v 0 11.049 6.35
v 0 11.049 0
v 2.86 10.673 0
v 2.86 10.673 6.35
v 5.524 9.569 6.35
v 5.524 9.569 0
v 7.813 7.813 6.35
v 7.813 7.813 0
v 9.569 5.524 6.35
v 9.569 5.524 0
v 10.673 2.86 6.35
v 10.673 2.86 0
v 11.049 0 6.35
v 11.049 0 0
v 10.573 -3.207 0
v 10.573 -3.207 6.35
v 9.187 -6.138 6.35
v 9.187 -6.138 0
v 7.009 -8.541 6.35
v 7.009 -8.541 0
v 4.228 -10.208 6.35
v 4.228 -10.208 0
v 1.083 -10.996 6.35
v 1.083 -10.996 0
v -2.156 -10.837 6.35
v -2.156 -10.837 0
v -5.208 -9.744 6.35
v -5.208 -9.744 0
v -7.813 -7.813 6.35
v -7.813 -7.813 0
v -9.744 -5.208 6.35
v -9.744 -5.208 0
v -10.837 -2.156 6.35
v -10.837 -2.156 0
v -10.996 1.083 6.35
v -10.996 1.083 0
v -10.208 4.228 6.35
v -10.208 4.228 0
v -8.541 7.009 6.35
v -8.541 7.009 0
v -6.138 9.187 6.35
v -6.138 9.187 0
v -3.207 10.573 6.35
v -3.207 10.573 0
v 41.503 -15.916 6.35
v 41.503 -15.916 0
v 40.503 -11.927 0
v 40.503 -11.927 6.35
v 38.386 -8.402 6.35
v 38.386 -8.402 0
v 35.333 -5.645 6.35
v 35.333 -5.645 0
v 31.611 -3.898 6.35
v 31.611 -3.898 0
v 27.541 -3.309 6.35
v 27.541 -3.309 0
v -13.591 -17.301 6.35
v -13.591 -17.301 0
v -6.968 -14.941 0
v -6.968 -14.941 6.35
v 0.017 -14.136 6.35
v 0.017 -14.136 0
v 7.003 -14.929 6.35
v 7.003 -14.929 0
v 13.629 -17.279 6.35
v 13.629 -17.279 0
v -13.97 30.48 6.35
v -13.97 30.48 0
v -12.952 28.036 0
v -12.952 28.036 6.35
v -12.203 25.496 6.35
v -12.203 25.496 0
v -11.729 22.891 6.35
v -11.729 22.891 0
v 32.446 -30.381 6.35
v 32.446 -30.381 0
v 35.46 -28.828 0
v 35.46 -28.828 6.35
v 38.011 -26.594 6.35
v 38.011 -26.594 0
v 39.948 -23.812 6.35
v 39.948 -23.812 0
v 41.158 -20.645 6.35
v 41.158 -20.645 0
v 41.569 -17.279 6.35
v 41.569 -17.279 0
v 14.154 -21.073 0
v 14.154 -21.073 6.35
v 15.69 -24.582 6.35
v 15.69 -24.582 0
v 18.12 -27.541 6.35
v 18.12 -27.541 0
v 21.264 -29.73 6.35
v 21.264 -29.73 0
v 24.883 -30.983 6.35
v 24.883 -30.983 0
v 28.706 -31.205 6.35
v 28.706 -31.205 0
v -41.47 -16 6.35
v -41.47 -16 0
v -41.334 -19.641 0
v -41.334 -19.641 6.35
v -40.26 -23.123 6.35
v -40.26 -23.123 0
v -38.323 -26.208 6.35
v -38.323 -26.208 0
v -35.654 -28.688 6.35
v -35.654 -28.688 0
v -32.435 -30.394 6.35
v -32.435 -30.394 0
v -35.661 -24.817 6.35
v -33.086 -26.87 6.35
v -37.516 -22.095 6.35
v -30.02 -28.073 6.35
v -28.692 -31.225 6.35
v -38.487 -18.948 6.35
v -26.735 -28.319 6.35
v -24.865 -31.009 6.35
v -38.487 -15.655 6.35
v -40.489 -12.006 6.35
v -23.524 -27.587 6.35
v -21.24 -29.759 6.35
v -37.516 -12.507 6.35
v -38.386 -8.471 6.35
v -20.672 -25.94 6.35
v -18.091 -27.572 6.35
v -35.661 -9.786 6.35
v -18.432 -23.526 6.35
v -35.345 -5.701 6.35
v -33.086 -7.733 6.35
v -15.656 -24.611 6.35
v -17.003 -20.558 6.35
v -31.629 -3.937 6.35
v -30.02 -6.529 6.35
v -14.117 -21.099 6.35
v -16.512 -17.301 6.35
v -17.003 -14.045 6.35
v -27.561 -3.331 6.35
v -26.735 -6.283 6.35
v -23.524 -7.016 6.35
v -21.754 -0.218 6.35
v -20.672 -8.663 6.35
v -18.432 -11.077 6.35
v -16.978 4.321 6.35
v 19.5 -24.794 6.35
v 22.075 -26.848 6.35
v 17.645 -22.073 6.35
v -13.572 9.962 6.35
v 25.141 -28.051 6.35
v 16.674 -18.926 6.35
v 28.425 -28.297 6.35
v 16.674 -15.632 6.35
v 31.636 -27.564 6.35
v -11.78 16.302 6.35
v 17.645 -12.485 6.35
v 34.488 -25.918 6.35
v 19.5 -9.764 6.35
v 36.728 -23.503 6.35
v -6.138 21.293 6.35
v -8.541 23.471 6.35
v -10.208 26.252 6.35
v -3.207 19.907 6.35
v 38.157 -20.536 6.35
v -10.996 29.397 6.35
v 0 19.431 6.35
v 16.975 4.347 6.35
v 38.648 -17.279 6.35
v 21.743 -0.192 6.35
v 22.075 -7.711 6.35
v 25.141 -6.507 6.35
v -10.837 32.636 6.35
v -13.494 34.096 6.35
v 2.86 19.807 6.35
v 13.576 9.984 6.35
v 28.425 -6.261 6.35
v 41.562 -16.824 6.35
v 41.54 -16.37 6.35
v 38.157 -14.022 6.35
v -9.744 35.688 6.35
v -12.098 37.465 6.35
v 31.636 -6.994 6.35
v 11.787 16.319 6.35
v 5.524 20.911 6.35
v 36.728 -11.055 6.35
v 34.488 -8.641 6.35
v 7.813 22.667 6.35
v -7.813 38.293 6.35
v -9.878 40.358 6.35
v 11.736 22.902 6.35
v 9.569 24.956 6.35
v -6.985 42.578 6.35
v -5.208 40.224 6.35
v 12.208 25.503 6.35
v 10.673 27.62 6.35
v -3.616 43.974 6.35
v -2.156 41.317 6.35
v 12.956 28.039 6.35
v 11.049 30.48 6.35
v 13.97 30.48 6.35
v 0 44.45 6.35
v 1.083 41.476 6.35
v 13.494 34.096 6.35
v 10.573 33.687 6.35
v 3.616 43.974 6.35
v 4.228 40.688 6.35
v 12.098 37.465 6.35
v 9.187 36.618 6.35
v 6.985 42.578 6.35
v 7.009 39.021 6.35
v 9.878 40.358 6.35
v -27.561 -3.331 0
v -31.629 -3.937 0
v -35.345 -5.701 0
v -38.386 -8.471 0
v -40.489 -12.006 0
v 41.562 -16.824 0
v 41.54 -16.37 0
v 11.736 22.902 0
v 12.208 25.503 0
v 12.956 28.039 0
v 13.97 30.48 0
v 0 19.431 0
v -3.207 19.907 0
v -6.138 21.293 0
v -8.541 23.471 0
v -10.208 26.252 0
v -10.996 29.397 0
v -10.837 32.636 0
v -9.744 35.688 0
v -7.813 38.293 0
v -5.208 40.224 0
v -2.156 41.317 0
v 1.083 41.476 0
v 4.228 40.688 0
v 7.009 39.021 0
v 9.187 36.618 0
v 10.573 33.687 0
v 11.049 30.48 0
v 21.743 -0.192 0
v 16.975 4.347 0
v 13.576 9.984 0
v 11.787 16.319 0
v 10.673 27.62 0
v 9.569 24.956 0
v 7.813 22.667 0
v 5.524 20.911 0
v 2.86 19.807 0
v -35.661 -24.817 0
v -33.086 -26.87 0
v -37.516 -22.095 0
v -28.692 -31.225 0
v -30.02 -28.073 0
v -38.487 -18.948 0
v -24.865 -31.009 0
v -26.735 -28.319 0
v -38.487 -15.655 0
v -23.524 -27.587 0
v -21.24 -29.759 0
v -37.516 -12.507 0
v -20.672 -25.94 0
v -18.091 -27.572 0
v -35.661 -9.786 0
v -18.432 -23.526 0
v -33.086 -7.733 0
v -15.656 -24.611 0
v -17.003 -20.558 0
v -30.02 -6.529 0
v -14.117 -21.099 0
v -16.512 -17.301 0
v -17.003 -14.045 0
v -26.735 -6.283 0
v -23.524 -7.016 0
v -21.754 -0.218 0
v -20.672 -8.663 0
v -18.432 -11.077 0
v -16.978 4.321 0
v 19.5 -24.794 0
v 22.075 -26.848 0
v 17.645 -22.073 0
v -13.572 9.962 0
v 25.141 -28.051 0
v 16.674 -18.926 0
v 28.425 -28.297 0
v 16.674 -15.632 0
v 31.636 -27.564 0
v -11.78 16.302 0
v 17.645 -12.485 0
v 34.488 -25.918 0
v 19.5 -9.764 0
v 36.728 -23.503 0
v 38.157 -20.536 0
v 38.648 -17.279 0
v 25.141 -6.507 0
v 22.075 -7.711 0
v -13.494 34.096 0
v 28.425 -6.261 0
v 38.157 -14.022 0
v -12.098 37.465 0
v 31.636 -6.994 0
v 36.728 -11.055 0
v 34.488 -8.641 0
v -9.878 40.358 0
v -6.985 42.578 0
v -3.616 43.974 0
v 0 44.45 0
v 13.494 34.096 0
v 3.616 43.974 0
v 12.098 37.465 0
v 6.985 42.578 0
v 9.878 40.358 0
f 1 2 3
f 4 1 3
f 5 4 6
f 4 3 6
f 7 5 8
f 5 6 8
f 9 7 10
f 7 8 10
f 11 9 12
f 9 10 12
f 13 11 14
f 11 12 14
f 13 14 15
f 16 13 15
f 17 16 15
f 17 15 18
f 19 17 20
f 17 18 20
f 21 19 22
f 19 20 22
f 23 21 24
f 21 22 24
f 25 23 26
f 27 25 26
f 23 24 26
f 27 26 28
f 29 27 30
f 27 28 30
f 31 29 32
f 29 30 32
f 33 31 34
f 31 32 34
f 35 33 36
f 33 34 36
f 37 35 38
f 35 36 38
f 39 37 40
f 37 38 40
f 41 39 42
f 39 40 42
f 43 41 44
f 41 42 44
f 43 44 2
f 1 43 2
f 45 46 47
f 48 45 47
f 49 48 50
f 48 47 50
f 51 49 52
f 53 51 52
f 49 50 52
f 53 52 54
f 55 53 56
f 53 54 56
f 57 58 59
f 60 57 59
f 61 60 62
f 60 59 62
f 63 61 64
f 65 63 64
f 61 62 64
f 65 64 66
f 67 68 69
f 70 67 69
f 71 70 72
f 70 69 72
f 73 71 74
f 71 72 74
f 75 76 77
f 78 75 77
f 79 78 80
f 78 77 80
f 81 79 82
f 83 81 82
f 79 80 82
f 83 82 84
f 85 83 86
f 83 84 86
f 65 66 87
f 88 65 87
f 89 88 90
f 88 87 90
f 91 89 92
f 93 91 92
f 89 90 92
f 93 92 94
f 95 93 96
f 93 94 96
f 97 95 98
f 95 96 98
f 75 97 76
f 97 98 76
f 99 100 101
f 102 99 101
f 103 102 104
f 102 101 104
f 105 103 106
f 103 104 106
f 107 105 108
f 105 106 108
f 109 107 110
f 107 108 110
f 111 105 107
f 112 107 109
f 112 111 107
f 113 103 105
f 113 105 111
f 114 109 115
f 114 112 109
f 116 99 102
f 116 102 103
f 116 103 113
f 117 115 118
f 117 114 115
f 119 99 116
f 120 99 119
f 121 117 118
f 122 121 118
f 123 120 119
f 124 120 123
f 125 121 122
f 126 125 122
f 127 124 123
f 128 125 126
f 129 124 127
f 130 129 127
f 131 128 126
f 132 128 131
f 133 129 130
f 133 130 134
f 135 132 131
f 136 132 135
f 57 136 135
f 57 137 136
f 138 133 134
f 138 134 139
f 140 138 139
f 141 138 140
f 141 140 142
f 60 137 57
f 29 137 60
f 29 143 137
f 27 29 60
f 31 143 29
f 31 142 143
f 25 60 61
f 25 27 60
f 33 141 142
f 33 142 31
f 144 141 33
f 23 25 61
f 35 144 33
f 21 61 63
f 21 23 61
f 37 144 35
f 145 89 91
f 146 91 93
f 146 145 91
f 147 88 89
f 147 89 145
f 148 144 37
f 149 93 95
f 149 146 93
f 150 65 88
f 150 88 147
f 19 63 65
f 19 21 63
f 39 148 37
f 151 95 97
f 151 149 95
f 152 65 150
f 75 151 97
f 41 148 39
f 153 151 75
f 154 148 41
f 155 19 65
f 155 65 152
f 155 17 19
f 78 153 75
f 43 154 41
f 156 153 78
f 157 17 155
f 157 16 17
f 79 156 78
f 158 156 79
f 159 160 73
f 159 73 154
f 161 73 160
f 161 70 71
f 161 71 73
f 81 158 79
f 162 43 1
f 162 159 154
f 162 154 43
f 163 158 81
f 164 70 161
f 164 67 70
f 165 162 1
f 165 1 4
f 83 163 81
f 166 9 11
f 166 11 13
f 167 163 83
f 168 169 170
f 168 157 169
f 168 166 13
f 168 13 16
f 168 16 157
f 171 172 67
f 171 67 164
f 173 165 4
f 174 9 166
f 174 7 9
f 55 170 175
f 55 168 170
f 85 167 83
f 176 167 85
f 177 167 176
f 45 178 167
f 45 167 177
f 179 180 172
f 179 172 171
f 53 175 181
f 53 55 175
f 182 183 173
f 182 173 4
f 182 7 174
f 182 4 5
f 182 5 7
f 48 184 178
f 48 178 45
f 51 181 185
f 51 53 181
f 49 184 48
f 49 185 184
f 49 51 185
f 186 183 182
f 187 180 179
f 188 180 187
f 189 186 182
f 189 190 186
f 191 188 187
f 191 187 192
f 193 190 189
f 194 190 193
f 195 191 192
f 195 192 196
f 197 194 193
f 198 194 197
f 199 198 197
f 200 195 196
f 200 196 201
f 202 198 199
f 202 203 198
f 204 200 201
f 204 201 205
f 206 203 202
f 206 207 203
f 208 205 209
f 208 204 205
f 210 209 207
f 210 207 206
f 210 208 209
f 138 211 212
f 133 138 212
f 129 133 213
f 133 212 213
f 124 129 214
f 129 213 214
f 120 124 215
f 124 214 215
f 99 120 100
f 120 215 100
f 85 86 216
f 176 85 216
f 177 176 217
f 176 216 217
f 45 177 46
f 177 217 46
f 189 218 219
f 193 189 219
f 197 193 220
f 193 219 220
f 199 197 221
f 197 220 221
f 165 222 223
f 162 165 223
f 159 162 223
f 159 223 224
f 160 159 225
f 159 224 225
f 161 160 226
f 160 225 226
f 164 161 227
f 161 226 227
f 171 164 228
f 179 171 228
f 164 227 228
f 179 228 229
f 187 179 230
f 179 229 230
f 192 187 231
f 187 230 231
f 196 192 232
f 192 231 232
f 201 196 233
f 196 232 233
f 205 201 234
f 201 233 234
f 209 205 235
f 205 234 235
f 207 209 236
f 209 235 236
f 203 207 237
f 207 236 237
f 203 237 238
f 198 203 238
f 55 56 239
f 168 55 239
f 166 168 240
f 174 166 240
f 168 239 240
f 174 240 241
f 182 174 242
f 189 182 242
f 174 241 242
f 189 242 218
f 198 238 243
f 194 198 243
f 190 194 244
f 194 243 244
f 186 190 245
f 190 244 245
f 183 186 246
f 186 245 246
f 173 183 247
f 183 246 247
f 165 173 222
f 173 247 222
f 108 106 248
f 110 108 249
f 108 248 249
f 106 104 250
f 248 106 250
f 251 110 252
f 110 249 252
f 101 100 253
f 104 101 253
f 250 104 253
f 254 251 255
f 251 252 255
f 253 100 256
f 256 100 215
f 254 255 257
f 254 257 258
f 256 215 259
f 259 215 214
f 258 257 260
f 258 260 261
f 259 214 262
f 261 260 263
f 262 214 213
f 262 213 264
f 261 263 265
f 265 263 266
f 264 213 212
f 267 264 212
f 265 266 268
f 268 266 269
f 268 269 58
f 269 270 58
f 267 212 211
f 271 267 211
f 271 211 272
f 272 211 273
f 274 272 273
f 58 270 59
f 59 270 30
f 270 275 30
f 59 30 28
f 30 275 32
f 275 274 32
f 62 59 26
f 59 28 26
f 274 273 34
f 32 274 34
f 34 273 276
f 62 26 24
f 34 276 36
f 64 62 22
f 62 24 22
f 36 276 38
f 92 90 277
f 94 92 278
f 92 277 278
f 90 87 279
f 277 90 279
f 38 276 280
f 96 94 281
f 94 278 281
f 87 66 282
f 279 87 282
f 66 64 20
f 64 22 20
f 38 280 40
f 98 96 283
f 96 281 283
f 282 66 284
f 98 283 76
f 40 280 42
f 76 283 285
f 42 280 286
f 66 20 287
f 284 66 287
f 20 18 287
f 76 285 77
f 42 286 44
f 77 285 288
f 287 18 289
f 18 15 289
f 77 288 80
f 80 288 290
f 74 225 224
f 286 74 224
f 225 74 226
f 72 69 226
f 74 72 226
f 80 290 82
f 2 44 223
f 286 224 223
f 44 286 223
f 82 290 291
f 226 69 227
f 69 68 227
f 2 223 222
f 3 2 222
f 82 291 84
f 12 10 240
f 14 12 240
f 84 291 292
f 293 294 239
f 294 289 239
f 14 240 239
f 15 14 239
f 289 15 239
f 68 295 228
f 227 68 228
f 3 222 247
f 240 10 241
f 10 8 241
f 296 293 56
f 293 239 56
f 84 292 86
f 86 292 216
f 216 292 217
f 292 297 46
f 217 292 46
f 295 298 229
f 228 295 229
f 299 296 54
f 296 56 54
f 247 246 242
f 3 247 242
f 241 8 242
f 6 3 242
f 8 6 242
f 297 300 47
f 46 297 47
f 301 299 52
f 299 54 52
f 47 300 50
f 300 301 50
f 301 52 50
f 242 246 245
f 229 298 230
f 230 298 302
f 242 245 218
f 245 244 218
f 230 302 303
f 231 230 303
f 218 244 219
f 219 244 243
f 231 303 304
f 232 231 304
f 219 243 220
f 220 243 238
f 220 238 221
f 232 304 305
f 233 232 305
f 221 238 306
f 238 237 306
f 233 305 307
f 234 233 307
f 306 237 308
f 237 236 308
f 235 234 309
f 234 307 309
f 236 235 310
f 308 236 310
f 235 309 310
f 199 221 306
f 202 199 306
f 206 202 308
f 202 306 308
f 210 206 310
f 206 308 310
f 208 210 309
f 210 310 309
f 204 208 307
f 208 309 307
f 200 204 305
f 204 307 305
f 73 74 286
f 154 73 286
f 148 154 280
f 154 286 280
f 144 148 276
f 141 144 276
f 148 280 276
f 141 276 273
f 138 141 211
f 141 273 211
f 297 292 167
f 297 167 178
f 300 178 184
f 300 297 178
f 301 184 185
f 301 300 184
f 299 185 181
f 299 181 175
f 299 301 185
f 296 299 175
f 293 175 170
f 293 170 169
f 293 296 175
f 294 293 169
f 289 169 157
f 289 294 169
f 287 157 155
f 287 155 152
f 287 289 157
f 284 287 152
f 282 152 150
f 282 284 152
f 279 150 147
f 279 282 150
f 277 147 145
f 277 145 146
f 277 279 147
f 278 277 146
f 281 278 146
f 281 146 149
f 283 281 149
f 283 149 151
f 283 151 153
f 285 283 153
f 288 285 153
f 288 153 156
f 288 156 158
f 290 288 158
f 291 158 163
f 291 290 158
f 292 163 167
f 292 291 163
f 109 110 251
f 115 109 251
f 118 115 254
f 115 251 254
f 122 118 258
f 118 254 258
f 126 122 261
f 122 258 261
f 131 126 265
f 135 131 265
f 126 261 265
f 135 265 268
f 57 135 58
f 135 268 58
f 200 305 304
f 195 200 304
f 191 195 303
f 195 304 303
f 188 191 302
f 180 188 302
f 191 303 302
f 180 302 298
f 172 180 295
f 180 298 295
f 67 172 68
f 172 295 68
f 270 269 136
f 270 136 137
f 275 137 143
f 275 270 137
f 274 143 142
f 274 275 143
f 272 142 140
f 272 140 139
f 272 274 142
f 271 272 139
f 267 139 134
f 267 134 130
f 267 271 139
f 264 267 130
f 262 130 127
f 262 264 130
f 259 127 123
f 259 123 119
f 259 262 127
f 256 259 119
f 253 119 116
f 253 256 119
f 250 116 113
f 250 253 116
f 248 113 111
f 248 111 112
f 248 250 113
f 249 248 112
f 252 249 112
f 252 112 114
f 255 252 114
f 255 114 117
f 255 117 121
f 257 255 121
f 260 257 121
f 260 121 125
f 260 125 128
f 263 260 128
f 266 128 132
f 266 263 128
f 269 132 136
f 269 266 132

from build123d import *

# Parameters (mm, degrees)
F0_R     = 11.049
F1_DEPTH = 6.35


with BuildPart() as f1:
    # F0 (on Top) → F1 (new body)
    with BuildSketch(Plane.XY):
        with BuildLine():
            ThreePointArc((13.629375726, -17.2792417221), (17.7003329036, -7.4217648034), (27.5405927913, -3.309365396))
            ThreePointArc((27.5405927913, -3.309365396), (15.086449318, 7.051761798), (11.7361280198, 22.9021243674))
            ThreePointArc((11.7361280198, 22.9021243674), (6.6819898762, 18.2116703951), (0, 16.51))
            ThreePointArc((0, 16.51), (-6.6763170276, 18.2085823579), (-11.7291158994, 22.891275455))
            ThreePointArc((-11.7291158994, 22.891275455), (-15.0856557039, 7.0272020842), (-27.5610287338, -3.3313813683))
            ThreePointArc((-27.5610287338, -3.3313813683), (-17.6827470006, -7.4230996351), (-13.5910287338, -17.3013813683))
            ThreePointArc((-13.5910287338, -17.3013813683), (0.0166082519, -14.1363774408), (13.629375726, -17.2792417221))
        make_face()
        with BuildLine():
            ThreePointArc((13.97, 0), (-9.8782817332, -9.8782817332), (0, 13.97))
            ThreePointArc((0, 13.97), (9.8782817332, 9.8782817332), (13.97, 0))
        make_face(mode=Mode.SUBTRACT)
        with BuildLine():
            ThreePointArc((13.97, 0), (9.8782817332, 9.8782817332), (0, 13.97))
            ThreePointArc((0, 13.97), (-9.8782817332, -9.8782817332), (13.97, 0))
        make_face()
        with BuildLine():
            ThreePointArc((11.049, 0), (-7.8128228253, -7.8128228253), (0, 11.049))
            ThreePointArc((0, 11.049), (7.8128228253, 7.8128228253), (11.049, 0))
        make_face(mode=Mode.SUBTRACT)
        with BuildLine():
            ThreePointArc((13.97, 30.48), (9.8782817686, 40.3582816978), (1.001e-07, 44.45))
            ThreePointArc((1.001e-07, 44.45), (-9.8782816978, 40.3582817686), (-13.97, 30.48))
            ThreePointArc((-13.97, 30.48), (-12.5435043089, 26.7760126955), (-11.7291158994, 22.891275455))
            ThreePointArc((-11.7291158994, 22.891275455), (-6.6763170276, 18.2085823579), (0, 16.51))
            ThreePointArc((0, 16.51), (6.6819898762, 18.2116703951), (11.7361280198, 22.9021243674))
            ThreePointArc((11.7361280198, 22.9021243674), (12.5479892343, 26.7809947751), (13.97, 30.48))
        make_face()
        with BuildLine():
            ThreePointArc((11.049, 30.48), (7.8128228253, 22.6671771747), (0, 19.431))
            ThreePointArc((0, 19.431), (-7.8128228253, 38.2928228253), (11.049, 30.48))
        make_face(mode=Mode.SUBTRACT)
        with BuildLine():
            ThreePointArc((-27.5610287338, -3.3313813683), (-36.9681276962, -6.9733908033), (-41.4703242711, -16.0004595199))
            ThreePointArc((-41.4703242711, -16.0004595199), (-37.6469546626, -23.6328014554), (-32.4351043479, -30.3935273692))
            ThreePointArc((-32.4351043479, -30.3935273692), (-19.5901422188, -28.7742131096), (-13.5910287338, -17.3013813683))
            ThreePointArc((-13.5910287338, -17.3013813683), (-17.6827470006, -7.4230996351), (-27.5610287338, -3.3313813683))
        make_face()
        with Locations((-27.5610287338, -17.3013813683)):
            Circle(F0_R, mode=Mode.SUBTRACT)
        with BuildLine():
            ThreePointArc((32.4464596099, -30.3814048191), (37.6753336679, -23.5875334236), (41.5027242234, -15.9162301452))
            ThreePointArc((41.5027242234, -15.9162301452), (36.9616008144, -6.9105561066), (27.5405927913, -3.309365396))
            ThreePointArc((27.5405927913, -3.309365396), (17.7003329036, -7.4217648034), (13.629375726, -17.2792417221))
            ThreePointArc((13.629375726, -17.2792417221), (19.6166713552, -28.7438538363), (32.4464596099, -30.3814048191))
        make_face()
        with Locations((27.599375726, -17.2792417221)):
            Circle(F0_R, mode=Mode.SUBTRACT)
        with BuildLine():
            ThreePointArc((41.569375726, -17.2792417221), (41.552702901, -16.5969216026), (41.5027242234, -15.9162301452))
            ThreePointArc((41.5027242234, -15.9162301452), (37.6753336679, -23.5875334236), (32.4464596099, -30.3814048191))
            ThreePointArc((32.4464596099, -30.3814048191), (39.0639878402, -25.2619460928), (41.569375726, -17.2792417221))
        make_face()
        with BuildLine():
            ThreePointArc((-32.4351043479, -30.3935273692), (-37.6469546626, -23.6328014554), (-41.4703242711, -16.0004595199))
            ThreePointArc((-41.4703242711, -16.0004595199), (-39.3929287706, -24.7288332543), (-32.4351043479, -30.3935273692))
        make_face()
    extrude(amount=F1_DEPTH)


solid = f1.part
